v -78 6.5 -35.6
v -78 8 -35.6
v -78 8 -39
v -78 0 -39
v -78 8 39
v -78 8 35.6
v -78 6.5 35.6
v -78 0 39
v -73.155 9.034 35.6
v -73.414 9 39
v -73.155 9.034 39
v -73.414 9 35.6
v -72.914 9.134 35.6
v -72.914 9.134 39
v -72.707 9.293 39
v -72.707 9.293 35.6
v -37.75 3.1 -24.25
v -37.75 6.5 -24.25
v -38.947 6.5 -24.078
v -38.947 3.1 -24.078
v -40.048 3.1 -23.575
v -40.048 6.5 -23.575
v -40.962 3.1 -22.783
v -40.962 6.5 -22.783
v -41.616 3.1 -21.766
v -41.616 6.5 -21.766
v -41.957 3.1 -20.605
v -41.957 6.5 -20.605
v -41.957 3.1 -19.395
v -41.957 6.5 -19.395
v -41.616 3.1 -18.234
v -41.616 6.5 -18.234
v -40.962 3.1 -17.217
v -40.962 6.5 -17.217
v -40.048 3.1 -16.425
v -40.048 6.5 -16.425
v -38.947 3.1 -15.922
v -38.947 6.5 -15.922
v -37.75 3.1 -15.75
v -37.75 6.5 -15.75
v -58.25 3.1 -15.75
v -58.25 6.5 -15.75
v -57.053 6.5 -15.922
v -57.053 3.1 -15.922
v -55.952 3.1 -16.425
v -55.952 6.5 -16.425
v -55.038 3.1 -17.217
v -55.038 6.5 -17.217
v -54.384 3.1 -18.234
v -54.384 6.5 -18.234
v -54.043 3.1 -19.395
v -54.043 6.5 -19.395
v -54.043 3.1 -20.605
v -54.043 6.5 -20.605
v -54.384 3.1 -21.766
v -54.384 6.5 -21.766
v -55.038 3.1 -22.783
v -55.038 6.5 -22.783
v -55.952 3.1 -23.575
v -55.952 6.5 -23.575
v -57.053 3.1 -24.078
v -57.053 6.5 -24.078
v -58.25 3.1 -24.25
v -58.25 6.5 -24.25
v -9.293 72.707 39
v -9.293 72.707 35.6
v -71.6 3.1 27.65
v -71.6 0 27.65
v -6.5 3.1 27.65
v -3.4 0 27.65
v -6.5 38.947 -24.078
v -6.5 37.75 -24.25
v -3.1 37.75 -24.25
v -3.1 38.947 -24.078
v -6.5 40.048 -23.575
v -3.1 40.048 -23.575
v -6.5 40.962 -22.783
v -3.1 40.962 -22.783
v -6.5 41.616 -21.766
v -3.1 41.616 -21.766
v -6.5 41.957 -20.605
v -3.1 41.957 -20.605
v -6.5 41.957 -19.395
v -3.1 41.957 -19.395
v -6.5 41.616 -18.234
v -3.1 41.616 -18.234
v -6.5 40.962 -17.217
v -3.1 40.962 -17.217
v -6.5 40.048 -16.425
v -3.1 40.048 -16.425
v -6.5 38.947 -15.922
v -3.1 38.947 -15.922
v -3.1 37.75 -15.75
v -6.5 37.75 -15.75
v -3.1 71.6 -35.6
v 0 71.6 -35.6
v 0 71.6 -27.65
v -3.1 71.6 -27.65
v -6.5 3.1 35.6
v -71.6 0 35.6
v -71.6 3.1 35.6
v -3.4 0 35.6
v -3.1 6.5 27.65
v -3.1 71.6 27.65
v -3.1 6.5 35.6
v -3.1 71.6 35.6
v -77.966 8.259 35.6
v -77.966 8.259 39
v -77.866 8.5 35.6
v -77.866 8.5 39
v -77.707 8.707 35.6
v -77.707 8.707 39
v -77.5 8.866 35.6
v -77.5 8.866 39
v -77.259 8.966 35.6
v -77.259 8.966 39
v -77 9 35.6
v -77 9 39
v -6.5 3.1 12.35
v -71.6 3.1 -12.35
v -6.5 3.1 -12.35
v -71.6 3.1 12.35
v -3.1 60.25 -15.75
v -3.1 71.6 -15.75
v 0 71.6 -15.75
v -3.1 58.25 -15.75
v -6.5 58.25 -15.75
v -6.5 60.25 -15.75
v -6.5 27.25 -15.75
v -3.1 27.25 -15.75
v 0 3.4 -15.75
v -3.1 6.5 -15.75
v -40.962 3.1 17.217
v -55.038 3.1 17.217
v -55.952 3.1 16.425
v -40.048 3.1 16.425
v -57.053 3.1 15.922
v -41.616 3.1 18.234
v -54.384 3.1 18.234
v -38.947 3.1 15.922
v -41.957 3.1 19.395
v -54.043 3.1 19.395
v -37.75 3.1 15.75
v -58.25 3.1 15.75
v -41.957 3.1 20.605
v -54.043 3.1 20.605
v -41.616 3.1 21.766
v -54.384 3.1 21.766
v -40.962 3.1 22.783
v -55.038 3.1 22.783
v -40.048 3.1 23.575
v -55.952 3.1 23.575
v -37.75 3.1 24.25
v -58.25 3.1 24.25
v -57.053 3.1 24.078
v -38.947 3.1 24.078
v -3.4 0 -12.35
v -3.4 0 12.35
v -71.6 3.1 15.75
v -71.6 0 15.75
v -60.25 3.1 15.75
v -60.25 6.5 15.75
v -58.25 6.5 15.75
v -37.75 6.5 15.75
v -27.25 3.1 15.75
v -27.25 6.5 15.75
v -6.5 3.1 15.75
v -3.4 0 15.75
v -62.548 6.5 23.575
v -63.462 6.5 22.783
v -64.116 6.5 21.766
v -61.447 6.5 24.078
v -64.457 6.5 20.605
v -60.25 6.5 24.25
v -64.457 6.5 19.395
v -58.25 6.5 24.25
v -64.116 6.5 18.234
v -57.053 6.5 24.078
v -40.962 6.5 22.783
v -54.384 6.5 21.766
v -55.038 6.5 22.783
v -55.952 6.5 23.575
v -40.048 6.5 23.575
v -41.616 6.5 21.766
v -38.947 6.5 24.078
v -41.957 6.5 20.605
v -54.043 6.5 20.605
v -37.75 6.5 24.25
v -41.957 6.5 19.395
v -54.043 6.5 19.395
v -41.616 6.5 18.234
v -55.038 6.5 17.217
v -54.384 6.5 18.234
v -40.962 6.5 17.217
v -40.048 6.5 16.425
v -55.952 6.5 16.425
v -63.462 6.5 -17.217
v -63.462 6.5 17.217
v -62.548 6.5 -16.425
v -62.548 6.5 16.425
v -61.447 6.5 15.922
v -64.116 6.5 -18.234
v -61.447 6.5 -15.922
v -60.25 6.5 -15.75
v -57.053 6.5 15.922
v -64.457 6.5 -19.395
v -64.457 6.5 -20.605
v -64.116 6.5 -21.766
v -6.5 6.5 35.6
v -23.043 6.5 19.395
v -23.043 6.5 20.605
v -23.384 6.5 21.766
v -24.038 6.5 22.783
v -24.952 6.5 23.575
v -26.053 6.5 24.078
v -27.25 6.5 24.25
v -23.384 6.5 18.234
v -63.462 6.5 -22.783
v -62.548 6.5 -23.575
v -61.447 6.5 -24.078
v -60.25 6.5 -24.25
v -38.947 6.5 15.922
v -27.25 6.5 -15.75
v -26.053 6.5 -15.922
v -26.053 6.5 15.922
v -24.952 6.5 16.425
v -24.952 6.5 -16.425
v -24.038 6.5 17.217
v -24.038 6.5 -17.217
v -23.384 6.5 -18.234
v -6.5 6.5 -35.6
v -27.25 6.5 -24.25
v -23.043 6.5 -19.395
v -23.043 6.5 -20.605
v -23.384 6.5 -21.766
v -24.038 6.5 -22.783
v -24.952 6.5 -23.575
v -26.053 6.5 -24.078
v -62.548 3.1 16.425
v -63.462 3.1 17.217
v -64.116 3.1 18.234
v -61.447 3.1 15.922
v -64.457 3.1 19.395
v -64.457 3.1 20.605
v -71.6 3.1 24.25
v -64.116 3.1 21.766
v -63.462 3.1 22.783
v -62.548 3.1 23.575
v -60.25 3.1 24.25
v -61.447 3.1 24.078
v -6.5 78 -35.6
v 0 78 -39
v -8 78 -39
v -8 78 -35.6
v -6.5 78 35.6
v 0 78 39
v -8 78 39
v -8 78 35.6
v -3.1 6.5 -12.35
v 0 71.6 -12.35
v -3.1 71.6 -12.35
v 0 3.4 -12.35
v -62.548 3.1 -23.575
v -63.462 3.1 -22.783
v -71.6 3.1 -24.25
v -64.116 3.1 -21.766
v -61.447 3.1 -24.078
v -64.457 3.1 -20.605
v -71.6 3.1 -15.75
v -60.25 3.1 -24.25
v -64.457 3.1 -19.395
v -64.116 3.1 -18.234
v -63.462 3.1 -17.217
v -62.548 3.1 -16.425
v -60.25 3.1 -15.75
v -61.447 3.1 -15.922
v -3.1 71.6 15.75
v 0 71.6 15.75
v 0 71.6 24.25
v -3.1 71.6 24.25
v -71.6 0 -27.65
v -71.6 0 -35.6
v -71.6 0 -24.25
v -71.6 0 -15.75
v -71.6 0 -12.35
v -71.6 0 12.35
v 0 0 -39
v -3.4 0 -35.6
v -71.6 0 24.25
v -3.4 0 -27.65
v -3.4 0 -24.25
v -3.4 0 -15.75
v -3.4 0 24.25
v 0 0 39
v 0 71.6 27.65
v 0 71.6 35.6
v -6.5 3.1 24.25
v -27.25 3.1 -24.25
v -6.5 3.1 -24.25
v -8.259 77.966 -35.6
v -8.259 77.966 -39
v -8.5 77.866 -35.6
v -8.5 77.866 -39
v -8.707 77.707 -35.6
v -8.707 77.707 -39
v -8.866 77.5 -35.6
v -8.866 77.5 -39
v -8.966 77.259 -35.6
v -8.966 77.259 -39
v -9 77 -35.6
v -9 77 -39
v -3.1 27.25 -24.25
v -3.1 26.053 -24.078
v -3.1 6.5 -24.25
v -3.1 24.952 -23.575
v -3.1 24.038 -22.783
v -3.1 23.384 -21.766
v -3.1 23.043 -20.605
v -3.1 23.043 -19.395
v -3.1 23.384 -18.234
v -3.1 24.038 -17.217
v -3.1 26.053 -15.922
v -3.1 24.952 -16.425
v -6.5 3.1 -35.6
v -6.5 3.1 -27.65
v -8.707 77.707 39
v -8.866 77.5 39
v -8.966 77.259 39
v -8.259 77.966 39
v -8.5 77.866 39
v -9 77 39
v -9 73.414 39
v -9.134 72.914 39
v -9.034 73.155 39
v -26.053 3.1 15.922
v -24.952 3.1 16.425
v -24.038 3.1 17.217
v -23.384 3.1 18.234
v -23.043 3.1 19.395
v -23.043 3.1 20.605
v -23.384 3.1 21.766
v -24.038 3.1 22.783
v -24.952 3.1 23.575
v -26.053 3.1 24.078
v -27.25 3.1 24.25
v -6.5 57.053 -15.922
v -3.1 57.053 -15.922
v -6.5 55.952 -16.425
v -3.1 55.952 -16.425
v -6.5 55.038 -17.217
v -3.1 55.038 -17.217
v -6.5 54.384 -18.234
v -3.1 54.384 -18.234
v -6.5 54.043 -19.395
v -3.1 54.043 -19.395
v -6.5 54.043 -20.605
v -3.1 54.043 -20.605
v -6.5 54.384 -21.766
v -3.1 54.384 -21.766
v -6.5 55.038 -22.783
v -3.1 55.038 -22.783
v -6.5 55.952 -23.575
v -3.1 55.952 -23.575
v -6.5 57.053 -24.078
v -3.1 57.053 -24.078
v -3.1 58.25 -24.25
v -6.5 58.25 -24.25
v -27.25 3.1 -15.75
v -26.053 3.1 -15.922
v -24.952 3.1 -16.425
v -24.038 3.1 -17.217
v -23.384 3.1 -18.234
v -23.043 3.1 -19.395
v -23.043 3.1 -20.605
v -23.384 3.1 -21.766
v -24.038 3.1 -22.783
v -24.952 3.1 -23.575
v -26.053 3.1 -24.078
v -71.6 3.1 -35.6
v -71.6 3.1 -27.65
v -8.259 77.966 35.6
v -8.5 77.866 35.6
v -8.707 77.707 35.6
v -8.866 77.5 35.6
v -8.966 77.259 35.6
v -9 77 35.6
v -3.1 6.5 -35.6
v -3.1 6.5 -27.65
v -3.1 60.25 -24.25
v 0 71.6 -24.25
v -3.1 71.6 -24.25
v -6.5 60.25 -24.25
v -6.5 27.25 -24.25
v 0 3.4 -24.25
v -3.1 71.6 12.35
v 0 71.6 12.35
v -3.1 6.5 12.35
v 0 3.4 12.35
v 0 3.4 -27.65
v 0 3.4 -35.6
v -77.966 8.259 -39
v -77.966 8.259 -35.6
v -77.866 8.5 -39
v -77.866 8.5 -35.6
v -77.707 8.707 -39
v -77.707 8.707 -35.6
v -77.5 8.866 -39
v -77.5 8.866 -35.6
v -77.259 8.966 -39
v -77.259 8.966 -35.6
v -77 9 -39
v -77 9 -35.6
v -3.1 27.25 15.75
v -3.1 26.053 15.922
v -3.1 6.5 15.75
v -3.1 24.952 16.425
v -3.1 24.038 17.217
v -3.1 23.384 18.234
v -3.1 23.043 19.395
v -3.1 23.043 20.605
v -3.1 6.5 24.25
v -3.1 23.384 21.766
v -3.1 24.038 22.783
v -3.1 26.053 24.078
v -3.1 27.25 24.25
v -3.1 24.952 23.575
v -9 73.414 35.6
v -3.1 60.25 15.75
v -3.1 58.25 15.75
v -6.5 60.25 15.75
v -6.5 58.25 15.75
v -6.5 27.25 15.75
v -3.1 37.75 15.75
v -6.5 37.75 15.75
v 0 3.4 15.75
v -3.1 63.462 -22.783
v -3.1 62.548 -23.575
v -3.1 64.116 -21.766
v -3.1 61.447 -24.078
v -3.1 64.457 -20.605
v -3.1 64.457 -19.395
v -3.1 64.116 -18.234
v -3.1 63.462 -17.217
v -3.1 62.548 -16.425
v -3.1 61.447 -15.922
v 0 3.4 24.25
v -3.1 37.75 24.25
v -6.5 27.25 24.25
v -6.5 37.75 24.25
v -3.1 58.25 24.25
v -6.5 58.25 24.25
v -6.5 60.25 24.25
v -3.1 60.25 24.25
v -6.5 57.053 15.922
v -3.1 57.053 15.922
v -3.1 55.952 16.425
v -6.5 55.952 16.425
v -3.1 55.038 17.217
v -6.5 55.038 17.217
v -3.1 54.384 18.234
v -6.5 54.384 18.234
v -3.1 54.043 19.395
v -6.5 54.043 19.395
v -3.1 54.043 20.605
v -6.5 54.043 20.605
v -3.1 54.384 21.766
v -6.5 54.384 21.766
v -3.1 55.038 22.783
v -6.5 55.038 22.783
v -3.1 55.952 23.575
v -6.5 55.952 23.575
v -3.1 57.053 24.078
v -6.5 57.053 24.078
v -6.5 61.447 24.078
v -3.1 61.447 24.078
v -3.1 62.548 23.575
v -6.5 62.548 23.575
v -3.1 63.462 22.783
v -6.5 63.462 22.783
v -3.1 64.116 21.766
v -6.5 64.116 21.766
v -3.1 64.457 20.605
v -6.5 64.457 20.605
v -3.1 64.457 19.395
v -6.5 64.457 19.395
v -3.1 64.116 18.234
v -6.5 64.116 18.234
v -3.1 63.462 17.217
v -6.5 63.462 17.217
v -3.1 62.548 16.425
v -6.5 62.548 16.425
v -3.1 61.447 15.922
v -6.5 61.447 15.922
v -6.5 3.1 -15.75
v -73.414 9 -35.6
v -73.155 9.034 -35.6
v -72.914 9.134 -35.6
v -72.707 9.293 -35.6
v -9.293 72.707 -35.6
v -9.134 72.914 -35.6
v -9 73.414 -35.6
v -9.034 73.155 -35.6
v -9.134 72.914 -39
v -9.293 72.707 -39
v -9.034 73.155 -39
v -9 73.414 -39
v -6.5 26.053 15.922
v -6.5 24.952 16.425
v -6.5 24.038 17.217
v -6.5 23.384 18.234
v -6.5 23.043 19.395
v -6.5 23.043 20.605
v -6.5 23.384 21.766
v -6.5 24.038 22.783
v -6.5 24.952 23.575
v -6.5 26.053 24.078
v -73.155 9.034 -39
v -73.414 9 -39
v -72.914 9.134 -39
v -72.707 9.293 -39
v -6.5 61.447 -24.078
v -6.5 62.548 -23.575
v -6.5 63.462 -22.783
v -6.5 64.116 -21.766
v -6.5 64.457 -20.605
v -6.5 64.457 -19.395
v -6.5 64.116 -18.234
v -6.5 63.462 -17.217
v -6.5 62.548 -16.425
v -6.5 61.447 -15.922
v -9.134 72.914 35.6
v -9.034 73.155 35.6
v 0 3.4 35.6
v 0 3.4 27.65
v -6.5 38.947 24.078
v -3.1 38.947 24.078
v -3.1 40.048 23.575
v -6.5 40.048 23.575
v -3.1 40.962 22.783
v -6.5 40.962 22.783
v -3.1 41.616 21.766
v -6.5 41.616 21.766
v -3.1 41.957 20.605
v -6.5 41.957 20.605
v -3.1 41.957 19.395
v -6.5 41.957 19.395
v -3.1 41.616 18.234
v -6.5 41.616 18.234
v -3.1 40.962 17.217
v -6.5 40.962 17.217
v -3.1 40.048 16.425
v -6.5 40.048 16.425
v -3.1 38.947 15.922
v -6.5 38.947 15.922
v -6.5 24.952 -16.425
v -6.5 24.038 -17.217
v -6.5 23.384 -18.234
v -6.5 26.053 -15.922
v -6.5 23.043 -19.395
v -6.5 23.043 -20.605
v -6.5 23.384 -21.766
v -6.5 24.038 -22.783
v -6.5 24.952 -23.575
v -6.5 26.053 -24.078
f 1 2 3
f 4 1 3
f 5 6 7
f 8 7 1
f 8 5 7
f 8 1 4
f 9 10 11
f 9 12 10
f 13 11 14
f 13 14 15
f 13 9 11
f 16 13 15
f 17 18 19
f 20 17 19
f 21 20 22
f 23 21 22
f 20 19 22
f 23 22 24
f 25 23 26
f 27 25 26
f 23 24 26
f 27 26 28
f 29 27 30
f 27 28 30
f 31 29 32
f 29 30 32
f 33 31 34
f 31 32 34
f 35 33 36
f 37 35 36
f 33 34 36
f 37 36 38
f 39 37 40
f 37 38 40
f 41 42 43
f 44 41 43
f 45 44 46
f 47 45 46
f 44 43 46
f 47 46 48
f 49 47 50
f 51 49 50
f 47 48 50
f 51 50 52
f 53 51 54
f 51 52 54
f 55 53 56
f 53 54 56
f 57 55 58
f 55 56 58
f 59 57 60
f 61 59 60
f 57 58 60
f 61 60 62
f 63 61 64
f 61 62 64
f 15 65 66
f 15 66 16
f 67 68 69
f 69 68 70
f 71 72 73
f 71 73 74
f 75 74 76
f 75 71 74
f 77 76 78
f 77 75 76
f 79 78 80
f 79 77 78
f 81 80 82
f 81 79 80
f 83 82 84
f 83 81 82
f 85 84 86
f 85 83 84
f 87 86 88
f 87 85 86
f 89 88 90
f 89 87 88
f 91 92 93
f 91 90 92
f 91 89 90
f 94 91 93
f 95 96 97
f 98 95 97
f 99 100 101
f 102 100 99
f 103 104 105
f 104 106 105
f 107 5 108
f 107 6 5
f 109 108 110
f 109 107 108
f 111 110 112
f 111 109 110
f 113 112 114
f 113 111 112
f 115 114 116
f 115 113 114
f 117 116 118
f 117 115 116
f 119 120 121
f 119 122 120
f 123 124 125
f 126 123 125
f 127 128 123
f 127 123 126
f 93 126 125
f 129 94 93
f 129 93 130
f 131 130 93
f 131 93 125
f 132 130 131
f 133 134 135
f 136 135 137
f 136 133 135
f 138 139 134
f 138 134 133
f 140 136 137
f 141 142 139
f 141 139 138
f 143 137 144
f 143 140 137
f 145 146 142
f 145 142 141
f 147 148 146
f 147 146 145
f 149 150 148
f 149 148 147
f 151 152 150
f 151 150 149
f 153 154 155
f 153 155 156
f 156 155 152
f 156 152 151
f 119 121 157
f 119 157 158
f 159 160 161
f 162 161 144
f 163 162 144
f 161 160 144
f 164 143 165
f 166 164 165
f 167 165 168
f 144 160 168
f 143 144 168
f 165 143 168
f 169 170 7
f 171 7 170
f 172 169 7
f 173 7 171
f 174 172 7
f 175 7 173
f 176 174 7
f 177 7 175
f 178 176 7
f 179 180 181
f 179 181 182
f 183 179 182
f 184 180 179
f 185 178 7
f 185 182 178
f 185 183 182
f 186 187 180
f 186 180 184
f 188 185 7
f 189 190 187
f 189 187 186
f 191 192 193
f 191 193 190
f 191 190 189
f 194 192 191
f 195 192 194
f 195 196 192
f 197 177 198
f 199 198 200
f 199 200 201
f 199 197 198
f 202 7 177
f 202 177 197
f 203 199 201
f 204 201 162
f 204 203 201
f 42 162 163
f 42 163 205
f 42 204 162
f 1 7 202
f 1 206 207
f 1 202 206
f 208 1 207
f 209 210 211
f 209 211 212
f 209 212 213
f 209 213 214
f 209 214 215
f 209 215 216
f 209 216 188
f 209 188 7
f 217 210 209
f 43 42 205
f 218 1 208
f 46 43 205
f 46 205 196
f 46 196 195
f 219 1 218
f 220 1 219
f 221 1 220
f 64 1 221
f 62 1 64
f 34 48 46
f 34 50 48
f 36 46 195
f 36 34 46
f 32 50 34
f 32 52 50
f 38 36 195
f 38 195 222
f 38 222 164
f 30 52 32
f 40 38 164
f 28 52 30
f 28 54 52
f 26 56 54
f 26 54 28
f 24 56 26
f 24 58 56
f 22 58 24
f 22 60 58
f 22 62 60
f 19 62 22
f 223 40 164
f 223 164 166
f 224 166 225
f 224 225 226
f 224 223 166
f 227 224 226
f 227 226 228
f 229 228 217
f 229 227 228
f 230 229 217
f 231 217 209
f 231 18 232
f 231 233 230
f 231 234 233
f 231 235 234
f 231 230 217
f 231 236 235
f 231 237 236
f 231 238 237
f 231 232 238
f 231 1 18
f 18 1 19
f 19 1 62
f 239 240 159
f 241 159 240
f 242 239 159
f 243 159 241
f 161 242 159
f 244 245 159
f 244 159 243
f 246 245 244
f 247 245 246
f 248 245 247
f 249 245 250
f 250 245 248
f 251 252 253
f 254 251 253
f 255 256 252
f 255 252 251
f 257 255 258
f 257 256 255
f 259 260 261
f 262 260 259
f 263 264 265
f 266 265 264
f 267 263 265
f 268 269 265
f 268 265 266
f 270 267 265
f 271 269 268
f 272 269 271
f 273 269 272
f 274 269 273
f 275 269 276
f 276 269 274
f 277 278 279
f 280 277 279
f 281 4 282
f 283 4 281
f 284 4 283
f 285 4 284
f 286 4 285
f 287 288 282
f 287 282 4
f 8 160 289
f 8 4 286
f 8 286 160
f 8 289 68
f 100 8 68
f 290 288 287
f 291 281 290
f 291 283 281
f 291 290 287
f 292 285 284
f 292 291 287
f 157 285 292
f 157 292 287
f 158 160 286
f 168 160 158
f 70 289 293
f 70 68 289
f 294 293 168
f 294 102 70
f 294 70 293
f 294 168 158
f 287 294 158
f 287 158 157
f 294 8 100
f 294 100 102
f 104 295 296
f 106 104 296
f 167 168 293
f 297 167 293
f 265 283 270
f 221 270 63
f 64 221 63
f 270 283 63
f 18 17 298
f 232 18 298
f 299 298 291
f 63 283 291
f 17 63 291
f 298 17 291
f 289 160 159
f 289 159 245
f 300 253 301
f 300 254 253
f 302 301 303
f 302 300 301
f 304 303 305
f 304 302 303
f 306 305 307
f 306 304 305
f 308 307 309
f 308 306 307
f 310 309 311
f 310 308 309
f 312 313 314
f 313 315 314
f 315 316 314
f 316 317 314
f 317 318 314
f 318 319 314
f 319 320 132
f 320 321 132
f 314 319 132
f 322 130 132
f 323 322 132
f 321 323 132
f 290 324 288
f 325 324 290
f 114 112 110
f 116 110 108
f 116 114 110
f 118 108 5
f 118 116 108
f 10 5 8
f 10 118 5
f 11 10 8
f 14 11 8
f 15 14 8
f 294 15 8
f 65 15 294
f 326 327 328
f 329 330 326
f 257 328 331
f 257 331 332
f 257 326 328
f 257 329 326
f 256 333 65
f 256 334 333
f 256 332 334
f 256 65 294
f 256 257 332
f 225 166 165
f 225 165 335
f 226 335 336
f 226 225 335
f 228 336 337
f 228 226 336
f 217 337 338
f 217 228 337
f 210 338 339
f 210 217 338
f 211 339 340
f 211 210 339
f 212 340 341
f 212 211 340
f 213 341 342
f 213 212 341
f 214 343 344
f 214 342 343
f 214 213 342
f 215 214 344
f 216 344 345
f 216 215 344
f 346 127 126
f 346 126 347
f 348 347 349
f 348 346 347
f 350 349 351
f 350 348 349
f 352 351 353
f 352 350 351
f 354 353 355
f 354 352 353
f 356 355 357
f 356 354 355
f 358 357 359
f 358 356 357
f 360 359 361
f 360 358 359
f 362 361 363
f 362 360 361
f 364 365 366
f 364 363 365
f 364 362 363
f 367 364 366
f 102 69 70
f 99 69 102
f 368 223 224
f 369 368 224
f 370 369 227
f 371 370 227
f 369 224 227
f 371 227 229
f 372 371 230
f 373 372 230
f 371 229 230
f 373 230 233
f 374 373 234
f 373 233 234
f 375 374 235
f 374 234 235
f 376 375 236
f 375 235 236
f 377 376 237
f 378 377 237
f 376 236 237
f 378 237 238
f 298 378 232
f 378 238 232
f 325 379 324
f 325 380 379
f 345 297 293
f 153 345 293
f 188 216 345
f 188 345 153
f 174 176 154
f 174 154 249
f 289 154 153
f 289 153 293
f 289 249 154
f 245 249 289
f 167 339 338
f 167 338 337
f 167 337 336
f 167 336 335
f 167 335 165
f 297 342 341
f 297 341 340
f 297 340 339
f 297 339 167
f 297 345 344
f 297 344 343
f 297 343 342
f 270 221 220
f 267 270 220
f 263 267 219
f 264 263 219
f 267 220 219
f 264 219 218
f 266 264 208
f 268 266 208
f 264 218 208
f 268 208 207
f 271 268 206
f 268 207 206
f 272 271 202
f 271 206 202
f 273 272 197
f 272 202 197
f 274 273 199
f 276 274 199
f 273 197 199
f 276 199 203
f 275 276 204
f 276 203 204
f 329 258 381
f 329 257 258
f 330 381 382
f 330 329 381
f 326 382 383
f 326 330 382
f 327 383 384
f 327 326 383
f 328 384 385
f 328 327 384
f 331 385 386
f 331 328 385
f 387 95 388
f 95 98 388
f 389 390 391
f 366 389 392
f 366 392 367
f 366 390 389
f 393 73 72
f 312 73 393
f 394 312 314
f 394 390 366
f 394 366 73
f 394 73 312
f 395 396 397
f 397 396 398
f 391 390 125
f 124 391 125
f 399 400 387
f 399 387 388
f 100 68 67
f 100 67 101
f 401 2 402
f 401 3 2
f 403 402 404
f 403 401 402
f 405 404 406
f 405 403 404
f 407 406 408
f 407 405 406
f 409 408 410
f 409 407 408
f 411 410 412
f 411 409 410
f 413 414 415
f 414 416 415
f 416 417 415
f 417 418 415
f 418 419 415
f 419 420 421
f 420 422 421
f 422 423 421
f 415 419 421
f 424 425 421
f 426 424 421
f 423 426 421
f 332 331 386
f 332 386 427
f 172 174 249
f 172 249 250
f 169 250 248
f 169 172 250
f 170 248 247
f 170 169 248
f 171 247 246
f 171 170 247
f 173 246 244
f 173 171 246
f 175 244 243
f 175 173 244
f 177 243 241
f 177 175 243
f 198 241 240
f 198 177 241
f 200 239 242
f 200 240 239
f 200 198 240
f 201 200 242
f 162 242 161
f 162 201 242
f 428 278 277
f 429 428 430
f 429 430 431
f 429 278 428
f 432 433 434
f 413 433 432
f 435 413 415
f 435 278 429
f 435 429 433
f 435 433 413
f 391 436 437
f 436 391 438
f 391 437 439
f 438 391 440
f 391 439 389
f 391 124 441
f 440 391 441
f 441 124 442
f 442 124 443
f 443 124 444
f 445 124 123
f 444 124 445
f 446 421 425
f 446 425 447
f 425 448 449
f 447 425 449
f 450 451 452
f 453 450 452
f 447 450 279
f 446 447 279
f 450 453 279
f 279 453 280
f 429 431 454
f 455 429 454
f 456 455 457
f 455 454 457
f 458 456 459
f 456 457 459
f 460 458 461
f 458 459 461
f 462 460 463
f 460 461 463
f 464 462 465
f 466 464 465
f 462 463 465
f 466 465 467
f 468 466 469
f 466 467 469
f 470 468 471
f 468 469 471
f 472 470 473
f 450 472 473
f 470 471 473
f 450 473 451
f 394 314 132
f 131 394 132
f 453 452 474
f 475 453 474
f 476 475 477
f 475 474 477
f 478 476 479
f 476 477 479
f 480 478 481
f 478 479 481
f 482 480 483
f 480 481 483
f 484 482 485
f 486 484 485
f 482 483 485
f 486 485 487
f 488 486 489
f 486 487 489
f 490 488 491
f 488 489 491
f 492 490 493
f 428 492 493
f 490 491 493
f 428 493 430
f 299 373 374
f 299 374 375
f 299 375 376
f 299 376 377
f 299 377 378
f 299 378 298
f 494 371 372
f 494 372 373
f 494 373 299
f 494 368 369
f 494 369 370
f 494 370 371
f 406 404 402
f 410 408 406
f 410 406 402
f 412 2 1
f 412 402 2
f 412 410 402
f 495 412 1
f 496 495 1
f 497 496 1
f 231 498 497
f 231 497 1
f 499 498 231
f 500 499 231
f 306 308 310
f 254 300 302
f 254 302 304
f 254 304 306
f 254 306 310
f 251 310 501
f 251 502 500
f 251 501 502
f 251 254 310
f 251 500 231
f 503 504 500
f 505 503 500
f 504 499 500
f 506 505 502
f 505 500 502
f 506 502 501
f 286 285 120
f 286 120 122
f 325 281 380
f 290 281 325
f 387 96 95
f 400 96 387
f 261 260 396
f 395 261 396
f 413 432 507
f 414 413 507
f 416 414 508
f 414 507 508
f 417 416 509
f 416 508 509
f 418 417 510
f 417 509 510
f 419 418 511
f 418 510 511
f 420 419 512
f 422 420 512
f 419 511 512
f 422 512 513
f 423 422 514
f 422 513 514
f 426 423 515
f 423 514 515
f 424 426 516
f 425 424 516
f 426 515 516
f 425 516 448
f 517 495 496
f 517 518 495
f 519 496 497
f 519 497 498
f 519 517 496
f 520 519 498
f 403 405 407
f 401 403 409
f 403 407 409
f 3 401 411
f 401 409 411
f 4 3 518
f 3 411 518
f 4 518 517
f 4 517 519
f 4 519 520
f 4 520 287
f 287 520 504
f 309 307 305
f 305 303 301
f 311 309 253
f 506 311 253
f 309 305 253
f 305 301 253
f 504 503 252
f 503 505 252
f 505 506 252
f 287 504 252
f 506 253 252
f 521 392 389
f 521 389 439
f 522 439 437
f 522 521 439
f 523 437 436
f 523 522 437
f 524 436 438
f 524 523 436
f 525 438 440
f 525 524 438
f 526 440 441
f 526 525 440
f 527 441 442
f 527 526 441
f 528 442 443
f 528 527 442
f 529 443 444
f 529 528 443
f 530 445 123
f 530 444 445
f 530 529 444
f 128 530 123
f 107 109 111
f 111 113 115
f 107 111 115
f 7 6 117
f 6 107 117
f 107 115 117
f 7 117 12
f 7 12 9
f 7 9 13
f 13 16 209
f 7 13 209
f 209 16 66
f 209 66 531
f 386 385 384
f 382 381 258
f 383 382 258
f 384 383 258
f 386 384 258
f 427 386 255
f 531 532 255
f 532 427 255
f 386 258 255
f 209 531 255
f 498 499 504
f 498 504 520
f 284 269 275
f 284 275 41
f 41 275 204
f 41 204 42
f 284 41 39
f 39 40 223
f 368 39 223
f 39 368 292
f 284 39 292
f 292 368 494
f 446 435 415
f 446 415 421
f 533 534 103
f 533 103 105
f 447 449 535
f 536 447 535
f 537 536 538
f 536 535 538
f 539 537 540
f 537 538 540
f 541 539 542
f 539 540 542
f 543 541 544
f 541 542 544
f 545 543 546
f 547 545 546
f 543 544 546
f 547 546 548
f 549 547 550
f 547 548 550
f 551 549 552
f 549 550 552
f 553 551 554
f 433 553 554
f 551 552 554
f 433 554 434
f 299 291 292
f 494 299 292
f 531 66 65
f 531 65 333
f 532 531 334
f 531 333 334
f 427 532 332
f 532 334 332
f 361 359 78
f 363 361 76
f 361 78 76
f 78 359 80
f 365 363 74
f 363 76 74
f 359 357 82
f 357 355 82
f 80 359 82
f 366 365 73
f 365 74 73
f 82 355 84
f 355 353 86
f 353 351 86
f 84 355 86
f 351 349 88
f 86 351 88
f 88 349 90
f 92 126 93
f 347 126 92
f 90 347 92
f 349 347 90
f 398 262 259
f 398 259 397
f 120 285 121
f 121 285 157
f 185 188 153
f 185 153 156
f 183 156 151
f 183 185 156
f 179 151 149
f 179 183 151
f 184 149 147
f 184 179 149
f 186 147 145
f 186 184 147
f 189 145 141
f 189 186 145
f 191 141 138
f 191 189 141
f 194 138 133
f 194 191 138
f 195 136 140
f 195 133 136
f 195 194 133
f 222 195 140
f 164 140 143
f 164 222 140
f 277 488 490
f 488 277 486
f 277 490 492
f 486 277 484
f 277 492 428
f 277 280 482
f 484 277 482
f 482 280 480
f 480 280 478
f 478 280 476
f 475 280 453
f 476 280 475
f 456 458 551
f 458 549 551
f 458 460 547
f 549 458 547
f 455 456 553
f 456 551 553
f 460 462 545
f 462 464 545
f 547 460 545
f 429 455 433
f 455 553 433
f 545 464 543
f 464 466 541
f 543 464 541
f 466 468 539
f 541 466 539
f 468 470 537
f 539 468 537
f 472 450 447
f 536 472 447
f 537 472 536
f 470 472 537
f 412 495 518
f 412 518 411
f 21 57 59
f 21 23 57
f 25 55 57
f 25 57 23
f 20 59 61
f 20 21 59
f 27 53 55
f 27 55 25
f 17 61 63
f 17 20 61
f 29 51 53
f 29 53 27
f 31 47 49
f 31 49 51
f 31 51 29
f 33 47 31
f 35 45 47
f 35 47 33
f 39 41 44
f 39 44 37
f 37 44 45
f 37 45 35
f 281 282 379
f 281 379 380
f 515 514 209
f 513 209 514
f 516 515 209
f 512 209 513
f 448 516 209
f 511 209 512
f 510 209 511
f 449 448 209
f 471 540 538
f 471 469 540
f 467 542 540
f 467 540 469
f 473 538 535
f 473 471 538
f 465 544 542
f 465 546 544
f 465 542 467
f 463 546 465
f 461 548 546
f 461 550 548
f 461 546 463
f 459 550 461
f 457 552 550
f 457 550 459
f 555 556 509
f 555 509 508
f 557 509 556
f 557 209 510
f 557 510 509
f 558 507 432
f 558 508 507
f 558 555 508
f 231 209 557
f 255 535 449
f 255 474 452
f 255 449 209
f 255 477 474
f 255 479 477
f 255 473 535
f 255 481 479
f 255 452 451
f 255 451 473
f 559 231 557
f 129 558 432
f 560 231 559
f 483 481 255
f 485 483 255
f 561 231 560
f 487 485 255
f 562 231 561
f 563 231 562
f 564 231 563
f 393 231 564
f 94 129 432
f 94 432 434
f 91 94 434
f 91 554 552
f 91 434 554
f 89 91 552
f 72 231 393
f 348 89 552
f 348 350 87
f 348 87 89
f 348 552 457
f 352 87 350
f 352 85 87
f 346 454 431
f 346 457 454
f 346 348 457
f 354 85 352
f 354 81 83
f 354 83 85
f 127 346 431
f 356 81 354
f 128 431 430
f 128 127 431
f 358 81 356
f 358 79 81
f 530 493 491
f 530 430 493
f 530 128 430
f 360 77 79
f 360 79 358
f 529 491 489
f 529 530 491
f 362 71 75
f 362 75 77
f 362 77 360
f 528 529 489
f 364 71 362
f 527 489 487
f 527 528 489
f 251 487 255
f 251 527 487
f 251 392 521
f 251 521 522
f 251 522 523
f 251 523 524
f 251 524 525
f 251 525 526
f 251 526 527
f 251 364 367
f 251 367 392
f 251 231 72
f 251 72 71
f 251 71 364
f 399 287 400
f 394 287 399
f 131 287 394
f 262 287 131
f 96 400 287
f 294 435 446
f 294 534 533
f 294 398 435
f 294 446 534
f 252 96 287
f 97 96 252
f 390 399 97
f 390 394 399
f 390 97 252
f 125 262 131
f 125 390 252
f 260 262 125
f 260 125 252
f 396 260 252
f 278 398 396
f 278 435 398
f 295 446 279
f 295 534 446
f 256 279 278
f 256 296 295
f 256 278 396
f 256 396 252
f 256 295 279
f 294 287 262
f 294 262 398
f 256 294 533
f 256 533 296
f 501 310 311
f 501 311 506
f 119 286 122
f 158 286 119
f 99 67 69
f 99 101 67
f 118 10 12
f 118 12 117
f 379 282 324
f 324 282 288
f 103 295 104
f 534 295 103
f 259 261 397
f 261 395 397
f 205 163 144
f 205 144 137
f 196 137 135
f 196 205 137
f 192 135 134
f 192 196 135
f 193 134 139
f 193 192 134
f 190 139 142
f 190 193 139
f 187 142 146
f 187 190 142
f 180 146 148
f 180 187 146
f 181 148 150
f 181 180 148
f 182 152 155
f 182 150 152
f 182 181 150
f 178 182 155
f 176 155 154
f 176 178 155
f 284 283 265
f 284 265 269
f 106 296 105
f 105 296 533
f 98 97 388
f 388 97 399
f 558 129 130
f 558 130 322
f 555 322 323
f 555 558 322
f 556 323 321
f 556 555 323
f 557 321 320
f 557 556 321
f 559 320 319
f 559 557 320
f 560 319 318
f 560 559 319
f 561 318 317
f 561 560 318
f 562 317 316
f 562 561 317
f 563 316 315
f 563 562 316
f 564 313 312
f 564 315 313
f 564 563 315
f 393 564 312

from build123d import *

# Parameters (mm, degrees)
BOSS_EXTRUDE1_DEPTH      = 39
CUT_EXTRUDE1_DEPTH       = 35.6
CUT_EXTRUDE1_DEPTH_BACK  = 35.6
SKETCH2_W                = 71.5
SKETCH2_H                = 71.5
CUT_EXTRUDE2_DEPTH       = 10
SKETCH5_W                = 68.2
SKETCH5_H                = 8.5
SKETCH5_H_2              = 7.95
SKETCH5_H_3              = 24.7
CUT_EXTRUDE3_DEPTH       = 3.1
CHAMFER1_SIZE            = 3.1
CHAMFER1_OF_MIRROR1_SIZE = 3.1
FILLET1_R                = 1


with BuildPart() as part:
    # Sketch1 → Boss-Extrude1 (new, symmetric)
    with BuildSketch(Plane.XY):
        Polygon((-78, 0), (0, 0), (0, 78), (-9, 78), (-9, 73), (-73, 9), (-78, 9), align=None)
    extrude(amount=BOSS_EXTRUDE1_DEPTH, both=True)

    # Sketch2 → Cut-Extrude1 (cut, two sides: drawn at the far end of the back side and taken through both)
    with BuildSketch(Plane.XY.offset(-CUT_EXTRUDE1_DEPTH_BACK)):
        with Locations((-42.25, 42.25)):
            Rectangle(SKETCH2_W, SKETCH2_H)
    extrude(amount=CUT_EXTRUDE1_DEPTH + CUT_EXTRUDE1_DEPTH_BACK, mode=Mode.SUBTRACT)

    # Sketch3 → Cut-Extrude2 (cut)
    with BuildSketch(Plane(origin=(0, 6.5, 0), x_dir=(1, 0, 0), z_dir=(0, 1, 0))):
        with BuildLine():
            Line((-27.25, -24.25), (-37.75, -24.25))
            ThreePointArc((-37.75, -24.25), (-42, -20), (-37.75, -15.75))
            Line((-37.75, -15.75), (-27.25, -15.75))
            ThreePointArc((-27.25, -15.75), (-23, -20), (-27.25, -24.25))
        make_face()
        with BuildLine():
            Line((-60.25, -15.75), (-58.25, -15.75))
            ThreePointArc((-58.25, -15.75), (-54, -20), (-58.25, -24.25))
            Line((-58.25, -24.25), (-60.25, -24.25))
            ThreePointArc((-60.25, -24.25), (-64.5, -20), (-60.25, -15.75))
        make_face()
        with BuildLine():
            Line((-27.25, 24.25), (-37.75, 24.25))
            ThreePointArc((-37.75, 24.25), (-42, 20), (-37.75, 15.75))
            Line((-37.75, 15.75), (-27.25, 15.75))
            ThreePointArc((-27.25, 15.75), (-23, 20), (-27.25, 24.25))
        make_face()
        with BuildLine():
            Line((-60.25, 15.75), (-58.25, 15.75))
            ThreePointArc((-58.25, 15.75), (-54, 20), (-58.25, 24.25))
            Line((-58.25, 24.25), (-60.25, 24.25))
            ThreePointArc((-60.25, 24.25), (-64.5, 20), (-60.25, 15.75))
        make_face()
    cut_extrude2 = extrude(amount=-CUT_EXTRUDE2_DEPTH, mode=Mode.SUBTRACT)

    # Sketch5 → Cut-Extrude3 (cut)
    with BuildSketch(Plane.XZ):
        with Locations((-37.5, 20)):
            Rectangle(SKETCH5_W, SKETCH5_H)
        with Locations((-37.5, 31.625)):
            Rectangle(SKETCH5_W, SKETCH5_H_2)
        with Locations((-37.5, 0)):
            Rectangle(SKETCH5_W, SKETCH5_H_3)
        with Locations((-37.5, -31.625)):
            Rectangle(SKETCH5_W, SKETCH5_H_2)
        with Locations((-37.5, -20)):
            Rectangle(SKETCH5_W, SKETCH5_H)
    cut_extrude3 = extrude(amount=-CUT_EXTRUDE3_DEPTH, mode=Mode.SUBTRACT)

    # Chamfer1
    chamfer1_edges = [part.edges().sort_by_distance(p)[0] for p in [
        (-3.4, 3.1, 31.625),
        (-3.4, 3.1, 20),
        (-3.4, 3.1, 0),
        (-3.4, 3.1, -20),
        (-3.4, 3.1, -31.625),
    ]]
    chamfer(chamfer1_edges, length=CHAMFER1_SIZE - 0.0001)  # a hair under: the kernel refuses the full size

    # Mirror1: Cut-Extrude2, Cut-Extrude3 across plane
    add(cut_extrude2.mirror(Plane(origin=(0, 0, 0), x_dir=(0, 0, 1), z_dir=(-0.7071067811865474, -0.7071067811865477, 0))), mode=Mode.SUBTRACT)
    add(cut_extrude3.mirror(Plane(origin=(0, 0, 0), x_dir=(0, 0, 1), z_dir=(-0.7071067811865474, -0.7071067811865477, 0))), mode=Mode.SUBTRACT)

    # Chamfer1 of Mirror1
    chamfer1_of_mirror1_edges = [part.edges().sort_by_distance(p)[0] for p in [
        (-3.1, 3.4, 31.625),
        (-3.1, 3.4, 20),
        (-3.1, 3.4, 0),
        (-3.1, 3.4, -20),
        (-3.1, 3.4, -31.625),
    ]]
    chamfer(chamfer1_of_mirror1_edges, length=CHAMFER1_OF_MIRROR1_SIZE - 0.0001)  # a hair under: the kernel refuses the full size

    # Fillet1
    fillet1_edges = [part.edges().sort_by_distance(p)[0] for p in [
        (-78, 9, 37.3),
        (-73, 9, 37.3),
        (-9, 73, 37.3),
        (-9, 78, 37.3),
        (-78, 9, -37.3),
        (-73, 9, -37.3),
        (-9, 73, -37.3),
        (-9, 78, -37.3),
    ]]
    fillet(fillet1_edges, radius=FILLET1_R)


solid = part.part
